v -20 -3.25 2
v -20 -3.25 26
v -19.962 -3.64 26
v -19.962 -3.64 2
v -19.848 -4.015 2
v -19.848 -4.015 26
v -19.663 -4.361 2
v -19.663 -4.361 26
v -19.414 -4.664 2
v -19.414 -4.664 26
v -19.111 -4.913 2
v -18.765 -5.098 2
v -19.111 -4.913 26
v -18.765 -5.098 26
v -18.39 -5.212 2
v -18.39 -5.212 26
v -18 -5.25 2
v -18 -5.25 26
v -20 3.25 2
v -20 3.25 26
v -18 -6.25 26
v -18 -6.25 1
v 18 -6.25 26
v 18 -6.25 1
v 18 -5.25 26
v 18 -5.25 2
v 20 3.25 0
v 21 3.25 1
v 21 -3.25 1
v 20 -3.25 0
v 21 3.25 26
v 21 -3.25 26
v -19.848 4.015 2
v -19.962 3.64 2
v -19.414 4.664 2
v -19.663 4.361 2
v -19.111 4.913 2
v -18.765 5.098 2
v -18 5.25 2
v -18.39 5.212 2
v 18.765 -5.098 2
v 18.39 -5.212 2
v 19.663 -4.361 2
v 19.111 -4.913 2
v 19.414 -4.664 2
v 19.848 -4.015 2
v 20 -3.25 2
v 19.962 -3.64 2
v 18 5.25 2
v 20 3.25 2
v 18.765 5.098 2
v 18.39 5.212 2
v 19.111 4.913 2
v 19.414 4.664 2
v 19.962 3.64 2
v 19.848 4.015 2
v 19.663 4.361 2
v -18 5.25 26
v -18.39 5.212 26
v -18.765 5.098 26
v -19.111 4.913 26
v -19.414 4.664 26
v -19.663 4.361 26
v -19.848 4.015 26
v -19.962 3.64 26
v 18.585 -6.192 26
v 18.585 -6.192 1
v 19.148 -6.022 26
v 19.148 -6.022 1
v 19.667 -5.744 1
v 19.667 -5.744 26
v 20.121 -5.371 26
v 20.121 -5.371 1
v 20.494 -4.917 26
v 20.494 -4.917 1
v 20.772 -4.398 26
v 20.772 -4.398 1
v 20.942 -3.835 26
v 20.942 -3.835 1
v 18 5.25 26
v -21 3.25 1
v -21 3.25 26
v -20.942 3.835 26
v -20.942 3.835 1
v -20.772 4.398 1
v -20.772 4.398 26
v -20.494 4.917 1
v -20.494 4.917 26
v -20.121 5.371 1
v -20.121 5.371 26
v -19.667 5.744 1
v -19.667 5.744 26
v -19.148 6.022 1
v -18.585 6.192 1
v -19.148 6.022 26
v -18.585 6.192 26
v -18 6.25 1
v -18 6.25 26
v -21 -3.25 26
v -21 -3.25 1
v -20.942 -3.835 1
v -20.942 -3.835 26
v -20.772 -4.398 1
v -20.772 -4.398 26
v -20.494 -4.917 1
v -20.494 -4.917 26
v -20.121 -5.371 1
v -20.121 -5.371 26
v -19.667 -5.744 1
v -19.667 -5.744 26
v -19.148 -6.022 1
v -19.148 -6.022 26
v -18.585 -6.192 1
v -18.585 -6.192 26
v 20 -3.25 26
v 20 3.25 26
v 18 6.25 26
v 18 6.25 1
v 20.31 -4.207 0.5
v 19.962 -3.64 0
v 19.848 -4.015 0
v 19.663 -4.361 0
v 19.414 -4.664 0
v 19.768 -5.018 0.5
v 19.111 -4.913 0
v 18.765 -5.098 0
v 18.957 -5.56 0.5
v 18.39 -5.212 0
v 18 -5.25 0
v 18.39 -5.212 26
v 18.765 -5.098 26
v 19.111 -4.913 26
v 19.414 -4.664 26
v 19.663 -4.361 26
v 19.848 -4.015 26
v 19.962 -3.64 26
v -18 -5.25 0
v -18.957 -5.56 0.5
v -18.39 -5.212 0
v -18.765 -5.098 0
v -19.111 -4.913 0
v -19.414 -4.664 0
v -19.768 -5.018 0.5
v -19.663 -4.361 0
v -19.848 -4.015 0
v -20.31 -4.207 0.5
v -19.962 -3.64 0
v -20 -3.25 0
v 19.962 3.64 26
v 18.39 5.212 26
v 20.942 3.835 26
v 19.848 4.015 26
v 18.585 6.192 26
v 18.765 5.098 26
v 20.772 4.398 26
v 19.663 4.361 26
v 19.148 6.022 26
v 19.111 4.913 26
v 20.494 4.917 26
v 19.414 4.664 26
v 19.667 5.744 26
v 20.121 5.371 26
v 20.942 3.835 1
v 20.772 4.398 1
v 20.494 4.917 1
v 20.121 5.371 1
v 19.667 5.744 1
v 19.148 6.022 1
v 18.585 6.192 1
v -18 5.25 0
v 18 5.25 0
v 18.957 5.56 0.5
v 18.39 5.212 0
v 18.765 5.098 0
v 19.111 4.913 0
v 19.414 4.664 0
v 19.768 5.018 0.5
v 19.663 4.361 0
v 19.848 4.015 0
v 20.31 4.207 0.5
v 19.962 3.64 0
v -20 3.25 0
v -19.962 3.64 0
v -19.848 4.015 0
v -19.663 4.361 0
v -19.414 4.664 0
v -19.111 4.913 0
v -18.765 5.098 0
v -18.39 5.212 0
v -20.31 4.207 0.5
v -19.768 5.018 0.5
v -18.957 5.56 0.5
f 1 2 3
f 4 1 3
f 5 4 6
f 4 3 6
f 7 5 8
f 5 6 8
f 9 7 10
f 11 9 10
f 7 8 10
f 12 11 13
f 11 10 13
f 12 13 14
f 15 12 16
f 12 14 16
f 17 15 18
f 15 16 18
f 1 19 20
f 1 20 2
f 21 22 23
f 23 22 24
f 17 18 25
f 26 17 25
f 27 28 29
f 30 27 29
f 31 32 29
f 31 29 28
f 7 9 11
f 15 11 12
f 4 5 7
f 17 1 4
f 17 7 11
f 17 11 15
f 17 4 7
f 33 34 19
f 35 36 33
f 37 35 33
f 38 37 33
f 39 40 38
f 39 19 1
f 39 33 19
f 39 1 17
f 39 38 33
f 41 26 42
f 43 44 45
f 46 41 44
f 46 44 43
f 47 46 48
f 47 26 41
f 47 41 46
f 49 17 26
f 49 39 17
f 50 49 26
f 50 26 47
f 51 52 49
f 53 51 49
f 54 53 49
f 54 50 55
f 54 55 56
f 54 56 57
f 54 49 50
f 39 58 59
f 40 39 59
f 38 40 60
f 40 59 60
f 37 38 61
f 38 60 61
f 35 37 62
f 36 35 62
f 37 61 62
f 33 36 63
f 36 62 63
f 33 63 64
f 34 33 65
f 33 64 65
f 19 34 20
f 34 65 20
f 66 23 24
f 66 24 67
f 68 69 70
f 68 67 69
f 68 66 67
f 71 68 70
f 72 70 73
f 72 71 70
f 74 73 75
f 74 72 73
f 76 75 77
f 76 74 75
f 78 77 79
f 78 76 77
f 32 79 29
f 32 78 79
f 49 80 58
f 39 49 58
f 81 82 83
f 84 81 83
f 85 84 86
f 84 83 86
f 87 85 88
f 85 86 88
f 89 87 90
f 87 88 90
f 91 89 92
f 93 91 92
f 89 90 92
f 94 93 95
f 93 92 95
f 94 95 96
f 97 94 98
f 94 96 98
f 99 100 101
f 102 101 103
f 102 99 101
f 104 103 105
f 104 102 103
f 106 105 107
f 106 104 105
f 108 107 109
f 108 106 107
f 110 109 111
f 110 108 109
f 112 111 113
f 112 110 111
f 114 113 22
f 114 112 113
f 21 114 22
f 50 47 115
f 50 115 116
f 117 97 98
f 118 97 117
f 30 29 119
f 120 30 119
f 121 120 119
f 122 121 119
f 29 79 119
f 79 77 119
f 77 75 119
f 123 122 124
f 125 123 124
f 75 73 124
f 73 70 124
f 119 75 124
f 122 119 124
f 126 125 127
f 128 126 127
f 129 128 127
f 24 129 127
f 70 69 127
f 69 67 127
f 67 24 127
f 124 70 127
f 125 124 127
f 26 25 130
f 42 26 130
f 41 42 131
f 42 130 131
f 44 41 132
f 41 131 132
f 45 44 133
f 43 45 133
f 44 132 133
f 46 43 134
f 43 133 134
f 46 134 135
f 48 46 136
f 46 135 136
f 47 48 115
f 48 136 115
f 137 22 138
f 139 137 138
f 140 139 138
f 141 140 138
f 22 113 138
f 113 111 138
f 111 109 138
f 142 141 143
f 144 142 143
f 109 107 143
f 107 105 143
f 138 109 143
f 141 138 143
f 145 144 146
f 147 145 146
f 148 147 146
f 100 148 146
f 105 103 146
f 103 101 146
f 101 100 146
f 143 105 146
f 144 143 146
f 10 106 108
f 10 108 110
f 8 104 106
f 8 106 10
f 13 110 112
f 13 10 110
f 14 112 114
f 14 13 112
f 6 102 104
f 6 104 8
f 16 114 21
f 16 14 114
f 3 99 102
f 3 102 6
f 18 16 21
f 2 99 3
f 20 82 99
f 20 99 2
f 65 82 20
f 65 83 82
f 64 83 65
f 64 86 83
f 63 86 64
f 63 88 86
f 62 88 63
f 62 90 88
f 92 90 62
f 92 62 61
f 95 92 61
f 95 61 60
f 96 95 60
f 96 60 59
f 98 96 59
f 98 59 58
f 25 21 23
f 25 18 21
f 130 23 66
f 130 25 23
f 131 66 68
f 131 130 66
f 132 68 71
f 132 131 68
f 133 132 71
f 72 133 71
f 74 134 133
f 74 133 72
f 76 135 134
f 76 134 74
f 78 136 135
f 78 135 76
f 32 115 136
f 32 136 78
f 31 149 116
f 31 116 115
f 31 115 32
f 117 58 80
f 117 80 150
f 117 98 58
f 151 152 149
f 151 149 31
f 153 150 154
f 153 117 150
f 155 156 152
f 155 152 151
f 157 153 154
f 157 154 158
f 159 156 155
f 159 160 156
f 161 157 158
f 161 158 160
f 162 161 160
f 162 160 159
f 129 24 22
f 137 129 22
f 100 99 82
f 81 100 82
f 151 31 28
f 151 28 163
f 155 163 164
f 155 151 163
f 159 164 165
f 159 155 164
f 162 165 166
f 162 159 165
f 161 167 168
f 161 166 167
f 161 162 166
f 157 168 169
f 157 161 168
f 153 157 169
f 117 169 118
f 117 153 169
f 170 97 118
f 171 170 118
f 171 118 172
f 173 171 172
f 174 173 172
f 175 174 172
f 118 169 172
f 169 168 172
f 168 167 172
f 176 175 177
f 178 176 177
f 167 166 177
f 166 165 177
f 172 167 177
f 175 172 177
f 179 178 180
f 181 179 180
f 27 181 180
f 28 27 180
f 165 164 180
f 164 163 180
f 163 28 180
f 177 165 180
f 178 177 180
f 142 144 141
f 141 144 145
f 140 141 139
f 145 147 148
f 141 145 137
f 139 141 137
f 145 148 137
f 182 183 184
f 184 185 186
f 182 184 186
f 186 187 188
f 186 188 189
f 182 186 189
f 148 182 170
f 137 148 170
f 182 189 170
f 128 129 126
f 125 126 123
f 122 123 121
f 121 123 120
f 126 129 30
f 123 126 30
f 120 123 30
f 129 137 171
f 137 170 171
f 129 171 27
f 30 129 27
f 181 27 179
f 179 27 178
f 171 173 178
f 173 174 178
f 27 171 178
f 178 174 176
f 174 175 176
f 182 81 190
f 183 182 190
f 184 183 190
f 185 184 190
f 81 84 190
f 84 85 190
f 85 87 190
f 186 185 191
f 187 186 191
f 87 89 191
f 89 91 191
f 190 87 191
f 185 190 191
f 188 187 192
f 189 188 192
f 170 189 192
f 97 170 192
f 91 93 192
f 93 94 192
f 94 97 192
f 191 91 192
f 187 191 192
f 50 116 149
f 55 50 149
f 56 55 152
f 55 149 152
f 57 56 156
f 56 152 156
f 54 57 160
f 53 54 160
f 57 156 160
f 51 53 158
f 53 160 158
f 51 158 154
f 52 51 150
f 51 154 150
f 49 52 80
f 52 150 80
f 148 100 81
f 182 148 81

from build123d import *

# Parameters (mm, degrees)
F0_W     = 42
F0_H     = 12.5
F1_DEPTH = 26
F2_R     = 3
F4_DEPTH = 24
F5_SIZE  = 1


with BuildPart() as f1:
    # F0 (on Top) → F1 (new body)
    with BuildSketch(Plane.XY):
        Rectangle(F0_W, F0_H)
    extrude(amount=F1_DEPTH)

    # F2
    f2_edges = [f1.edges().sort_by_distance(p)[0] for p in [
        (-21, 6.25, 13),
        (-21, -6.25, 13),
        (21, 6.25, 13),
        (21, -6.25, 13),
    ]]
    fillet(f2_edges, radius=F2_R)

    # F3 (on face) → F4 (cut)
    with BuildSketch(Plane.XY.offset(26)):
        with BuildLine():
            Line((18, 5.25), (-18, 5.25))
            ThreePointArc((-18, 5.25), (-19.4142135624, 4.6642135624), (-20, 3.25))
            Line((-20, 3.25), (-20, -3.25))
            ThreePointArc((-20, -3.25), (-19.4142135624, -4.6642135624), (-18, -5.25))
            Line((-18, -5.25), (18, -5.25))
            ThreePointArc((18, -5.25), (19.4142135624, -4.6642135624), (20, -3.25))
            Line((20, -3.25), (20, 3.25))
            ThreePointArc((20, 3.25), (19.4142135624, 4.6642135624), (18, 5.25))
        make_face()
    extrude(amount=-F4_DEPTH, mode=Mode.SUBTRACT)

    # F5
    f5_edges = [f1.edges().sort_by_distance(p)[0] for p in [
        (0, 6.25, 0),
        (20.12132, 5.37132, 0),
        (21, 0, 0),
        (20.12132, -5.37132, 0),
        (0, -6.25, 0),
        (-20.12132, -5.37132, 0),
        (-21, 0, 0),
        (-20.12132, 5.37132, 0),
    ]]
    chamfer(f5_edges, length=F5_SIZE)


solid = f1.part
